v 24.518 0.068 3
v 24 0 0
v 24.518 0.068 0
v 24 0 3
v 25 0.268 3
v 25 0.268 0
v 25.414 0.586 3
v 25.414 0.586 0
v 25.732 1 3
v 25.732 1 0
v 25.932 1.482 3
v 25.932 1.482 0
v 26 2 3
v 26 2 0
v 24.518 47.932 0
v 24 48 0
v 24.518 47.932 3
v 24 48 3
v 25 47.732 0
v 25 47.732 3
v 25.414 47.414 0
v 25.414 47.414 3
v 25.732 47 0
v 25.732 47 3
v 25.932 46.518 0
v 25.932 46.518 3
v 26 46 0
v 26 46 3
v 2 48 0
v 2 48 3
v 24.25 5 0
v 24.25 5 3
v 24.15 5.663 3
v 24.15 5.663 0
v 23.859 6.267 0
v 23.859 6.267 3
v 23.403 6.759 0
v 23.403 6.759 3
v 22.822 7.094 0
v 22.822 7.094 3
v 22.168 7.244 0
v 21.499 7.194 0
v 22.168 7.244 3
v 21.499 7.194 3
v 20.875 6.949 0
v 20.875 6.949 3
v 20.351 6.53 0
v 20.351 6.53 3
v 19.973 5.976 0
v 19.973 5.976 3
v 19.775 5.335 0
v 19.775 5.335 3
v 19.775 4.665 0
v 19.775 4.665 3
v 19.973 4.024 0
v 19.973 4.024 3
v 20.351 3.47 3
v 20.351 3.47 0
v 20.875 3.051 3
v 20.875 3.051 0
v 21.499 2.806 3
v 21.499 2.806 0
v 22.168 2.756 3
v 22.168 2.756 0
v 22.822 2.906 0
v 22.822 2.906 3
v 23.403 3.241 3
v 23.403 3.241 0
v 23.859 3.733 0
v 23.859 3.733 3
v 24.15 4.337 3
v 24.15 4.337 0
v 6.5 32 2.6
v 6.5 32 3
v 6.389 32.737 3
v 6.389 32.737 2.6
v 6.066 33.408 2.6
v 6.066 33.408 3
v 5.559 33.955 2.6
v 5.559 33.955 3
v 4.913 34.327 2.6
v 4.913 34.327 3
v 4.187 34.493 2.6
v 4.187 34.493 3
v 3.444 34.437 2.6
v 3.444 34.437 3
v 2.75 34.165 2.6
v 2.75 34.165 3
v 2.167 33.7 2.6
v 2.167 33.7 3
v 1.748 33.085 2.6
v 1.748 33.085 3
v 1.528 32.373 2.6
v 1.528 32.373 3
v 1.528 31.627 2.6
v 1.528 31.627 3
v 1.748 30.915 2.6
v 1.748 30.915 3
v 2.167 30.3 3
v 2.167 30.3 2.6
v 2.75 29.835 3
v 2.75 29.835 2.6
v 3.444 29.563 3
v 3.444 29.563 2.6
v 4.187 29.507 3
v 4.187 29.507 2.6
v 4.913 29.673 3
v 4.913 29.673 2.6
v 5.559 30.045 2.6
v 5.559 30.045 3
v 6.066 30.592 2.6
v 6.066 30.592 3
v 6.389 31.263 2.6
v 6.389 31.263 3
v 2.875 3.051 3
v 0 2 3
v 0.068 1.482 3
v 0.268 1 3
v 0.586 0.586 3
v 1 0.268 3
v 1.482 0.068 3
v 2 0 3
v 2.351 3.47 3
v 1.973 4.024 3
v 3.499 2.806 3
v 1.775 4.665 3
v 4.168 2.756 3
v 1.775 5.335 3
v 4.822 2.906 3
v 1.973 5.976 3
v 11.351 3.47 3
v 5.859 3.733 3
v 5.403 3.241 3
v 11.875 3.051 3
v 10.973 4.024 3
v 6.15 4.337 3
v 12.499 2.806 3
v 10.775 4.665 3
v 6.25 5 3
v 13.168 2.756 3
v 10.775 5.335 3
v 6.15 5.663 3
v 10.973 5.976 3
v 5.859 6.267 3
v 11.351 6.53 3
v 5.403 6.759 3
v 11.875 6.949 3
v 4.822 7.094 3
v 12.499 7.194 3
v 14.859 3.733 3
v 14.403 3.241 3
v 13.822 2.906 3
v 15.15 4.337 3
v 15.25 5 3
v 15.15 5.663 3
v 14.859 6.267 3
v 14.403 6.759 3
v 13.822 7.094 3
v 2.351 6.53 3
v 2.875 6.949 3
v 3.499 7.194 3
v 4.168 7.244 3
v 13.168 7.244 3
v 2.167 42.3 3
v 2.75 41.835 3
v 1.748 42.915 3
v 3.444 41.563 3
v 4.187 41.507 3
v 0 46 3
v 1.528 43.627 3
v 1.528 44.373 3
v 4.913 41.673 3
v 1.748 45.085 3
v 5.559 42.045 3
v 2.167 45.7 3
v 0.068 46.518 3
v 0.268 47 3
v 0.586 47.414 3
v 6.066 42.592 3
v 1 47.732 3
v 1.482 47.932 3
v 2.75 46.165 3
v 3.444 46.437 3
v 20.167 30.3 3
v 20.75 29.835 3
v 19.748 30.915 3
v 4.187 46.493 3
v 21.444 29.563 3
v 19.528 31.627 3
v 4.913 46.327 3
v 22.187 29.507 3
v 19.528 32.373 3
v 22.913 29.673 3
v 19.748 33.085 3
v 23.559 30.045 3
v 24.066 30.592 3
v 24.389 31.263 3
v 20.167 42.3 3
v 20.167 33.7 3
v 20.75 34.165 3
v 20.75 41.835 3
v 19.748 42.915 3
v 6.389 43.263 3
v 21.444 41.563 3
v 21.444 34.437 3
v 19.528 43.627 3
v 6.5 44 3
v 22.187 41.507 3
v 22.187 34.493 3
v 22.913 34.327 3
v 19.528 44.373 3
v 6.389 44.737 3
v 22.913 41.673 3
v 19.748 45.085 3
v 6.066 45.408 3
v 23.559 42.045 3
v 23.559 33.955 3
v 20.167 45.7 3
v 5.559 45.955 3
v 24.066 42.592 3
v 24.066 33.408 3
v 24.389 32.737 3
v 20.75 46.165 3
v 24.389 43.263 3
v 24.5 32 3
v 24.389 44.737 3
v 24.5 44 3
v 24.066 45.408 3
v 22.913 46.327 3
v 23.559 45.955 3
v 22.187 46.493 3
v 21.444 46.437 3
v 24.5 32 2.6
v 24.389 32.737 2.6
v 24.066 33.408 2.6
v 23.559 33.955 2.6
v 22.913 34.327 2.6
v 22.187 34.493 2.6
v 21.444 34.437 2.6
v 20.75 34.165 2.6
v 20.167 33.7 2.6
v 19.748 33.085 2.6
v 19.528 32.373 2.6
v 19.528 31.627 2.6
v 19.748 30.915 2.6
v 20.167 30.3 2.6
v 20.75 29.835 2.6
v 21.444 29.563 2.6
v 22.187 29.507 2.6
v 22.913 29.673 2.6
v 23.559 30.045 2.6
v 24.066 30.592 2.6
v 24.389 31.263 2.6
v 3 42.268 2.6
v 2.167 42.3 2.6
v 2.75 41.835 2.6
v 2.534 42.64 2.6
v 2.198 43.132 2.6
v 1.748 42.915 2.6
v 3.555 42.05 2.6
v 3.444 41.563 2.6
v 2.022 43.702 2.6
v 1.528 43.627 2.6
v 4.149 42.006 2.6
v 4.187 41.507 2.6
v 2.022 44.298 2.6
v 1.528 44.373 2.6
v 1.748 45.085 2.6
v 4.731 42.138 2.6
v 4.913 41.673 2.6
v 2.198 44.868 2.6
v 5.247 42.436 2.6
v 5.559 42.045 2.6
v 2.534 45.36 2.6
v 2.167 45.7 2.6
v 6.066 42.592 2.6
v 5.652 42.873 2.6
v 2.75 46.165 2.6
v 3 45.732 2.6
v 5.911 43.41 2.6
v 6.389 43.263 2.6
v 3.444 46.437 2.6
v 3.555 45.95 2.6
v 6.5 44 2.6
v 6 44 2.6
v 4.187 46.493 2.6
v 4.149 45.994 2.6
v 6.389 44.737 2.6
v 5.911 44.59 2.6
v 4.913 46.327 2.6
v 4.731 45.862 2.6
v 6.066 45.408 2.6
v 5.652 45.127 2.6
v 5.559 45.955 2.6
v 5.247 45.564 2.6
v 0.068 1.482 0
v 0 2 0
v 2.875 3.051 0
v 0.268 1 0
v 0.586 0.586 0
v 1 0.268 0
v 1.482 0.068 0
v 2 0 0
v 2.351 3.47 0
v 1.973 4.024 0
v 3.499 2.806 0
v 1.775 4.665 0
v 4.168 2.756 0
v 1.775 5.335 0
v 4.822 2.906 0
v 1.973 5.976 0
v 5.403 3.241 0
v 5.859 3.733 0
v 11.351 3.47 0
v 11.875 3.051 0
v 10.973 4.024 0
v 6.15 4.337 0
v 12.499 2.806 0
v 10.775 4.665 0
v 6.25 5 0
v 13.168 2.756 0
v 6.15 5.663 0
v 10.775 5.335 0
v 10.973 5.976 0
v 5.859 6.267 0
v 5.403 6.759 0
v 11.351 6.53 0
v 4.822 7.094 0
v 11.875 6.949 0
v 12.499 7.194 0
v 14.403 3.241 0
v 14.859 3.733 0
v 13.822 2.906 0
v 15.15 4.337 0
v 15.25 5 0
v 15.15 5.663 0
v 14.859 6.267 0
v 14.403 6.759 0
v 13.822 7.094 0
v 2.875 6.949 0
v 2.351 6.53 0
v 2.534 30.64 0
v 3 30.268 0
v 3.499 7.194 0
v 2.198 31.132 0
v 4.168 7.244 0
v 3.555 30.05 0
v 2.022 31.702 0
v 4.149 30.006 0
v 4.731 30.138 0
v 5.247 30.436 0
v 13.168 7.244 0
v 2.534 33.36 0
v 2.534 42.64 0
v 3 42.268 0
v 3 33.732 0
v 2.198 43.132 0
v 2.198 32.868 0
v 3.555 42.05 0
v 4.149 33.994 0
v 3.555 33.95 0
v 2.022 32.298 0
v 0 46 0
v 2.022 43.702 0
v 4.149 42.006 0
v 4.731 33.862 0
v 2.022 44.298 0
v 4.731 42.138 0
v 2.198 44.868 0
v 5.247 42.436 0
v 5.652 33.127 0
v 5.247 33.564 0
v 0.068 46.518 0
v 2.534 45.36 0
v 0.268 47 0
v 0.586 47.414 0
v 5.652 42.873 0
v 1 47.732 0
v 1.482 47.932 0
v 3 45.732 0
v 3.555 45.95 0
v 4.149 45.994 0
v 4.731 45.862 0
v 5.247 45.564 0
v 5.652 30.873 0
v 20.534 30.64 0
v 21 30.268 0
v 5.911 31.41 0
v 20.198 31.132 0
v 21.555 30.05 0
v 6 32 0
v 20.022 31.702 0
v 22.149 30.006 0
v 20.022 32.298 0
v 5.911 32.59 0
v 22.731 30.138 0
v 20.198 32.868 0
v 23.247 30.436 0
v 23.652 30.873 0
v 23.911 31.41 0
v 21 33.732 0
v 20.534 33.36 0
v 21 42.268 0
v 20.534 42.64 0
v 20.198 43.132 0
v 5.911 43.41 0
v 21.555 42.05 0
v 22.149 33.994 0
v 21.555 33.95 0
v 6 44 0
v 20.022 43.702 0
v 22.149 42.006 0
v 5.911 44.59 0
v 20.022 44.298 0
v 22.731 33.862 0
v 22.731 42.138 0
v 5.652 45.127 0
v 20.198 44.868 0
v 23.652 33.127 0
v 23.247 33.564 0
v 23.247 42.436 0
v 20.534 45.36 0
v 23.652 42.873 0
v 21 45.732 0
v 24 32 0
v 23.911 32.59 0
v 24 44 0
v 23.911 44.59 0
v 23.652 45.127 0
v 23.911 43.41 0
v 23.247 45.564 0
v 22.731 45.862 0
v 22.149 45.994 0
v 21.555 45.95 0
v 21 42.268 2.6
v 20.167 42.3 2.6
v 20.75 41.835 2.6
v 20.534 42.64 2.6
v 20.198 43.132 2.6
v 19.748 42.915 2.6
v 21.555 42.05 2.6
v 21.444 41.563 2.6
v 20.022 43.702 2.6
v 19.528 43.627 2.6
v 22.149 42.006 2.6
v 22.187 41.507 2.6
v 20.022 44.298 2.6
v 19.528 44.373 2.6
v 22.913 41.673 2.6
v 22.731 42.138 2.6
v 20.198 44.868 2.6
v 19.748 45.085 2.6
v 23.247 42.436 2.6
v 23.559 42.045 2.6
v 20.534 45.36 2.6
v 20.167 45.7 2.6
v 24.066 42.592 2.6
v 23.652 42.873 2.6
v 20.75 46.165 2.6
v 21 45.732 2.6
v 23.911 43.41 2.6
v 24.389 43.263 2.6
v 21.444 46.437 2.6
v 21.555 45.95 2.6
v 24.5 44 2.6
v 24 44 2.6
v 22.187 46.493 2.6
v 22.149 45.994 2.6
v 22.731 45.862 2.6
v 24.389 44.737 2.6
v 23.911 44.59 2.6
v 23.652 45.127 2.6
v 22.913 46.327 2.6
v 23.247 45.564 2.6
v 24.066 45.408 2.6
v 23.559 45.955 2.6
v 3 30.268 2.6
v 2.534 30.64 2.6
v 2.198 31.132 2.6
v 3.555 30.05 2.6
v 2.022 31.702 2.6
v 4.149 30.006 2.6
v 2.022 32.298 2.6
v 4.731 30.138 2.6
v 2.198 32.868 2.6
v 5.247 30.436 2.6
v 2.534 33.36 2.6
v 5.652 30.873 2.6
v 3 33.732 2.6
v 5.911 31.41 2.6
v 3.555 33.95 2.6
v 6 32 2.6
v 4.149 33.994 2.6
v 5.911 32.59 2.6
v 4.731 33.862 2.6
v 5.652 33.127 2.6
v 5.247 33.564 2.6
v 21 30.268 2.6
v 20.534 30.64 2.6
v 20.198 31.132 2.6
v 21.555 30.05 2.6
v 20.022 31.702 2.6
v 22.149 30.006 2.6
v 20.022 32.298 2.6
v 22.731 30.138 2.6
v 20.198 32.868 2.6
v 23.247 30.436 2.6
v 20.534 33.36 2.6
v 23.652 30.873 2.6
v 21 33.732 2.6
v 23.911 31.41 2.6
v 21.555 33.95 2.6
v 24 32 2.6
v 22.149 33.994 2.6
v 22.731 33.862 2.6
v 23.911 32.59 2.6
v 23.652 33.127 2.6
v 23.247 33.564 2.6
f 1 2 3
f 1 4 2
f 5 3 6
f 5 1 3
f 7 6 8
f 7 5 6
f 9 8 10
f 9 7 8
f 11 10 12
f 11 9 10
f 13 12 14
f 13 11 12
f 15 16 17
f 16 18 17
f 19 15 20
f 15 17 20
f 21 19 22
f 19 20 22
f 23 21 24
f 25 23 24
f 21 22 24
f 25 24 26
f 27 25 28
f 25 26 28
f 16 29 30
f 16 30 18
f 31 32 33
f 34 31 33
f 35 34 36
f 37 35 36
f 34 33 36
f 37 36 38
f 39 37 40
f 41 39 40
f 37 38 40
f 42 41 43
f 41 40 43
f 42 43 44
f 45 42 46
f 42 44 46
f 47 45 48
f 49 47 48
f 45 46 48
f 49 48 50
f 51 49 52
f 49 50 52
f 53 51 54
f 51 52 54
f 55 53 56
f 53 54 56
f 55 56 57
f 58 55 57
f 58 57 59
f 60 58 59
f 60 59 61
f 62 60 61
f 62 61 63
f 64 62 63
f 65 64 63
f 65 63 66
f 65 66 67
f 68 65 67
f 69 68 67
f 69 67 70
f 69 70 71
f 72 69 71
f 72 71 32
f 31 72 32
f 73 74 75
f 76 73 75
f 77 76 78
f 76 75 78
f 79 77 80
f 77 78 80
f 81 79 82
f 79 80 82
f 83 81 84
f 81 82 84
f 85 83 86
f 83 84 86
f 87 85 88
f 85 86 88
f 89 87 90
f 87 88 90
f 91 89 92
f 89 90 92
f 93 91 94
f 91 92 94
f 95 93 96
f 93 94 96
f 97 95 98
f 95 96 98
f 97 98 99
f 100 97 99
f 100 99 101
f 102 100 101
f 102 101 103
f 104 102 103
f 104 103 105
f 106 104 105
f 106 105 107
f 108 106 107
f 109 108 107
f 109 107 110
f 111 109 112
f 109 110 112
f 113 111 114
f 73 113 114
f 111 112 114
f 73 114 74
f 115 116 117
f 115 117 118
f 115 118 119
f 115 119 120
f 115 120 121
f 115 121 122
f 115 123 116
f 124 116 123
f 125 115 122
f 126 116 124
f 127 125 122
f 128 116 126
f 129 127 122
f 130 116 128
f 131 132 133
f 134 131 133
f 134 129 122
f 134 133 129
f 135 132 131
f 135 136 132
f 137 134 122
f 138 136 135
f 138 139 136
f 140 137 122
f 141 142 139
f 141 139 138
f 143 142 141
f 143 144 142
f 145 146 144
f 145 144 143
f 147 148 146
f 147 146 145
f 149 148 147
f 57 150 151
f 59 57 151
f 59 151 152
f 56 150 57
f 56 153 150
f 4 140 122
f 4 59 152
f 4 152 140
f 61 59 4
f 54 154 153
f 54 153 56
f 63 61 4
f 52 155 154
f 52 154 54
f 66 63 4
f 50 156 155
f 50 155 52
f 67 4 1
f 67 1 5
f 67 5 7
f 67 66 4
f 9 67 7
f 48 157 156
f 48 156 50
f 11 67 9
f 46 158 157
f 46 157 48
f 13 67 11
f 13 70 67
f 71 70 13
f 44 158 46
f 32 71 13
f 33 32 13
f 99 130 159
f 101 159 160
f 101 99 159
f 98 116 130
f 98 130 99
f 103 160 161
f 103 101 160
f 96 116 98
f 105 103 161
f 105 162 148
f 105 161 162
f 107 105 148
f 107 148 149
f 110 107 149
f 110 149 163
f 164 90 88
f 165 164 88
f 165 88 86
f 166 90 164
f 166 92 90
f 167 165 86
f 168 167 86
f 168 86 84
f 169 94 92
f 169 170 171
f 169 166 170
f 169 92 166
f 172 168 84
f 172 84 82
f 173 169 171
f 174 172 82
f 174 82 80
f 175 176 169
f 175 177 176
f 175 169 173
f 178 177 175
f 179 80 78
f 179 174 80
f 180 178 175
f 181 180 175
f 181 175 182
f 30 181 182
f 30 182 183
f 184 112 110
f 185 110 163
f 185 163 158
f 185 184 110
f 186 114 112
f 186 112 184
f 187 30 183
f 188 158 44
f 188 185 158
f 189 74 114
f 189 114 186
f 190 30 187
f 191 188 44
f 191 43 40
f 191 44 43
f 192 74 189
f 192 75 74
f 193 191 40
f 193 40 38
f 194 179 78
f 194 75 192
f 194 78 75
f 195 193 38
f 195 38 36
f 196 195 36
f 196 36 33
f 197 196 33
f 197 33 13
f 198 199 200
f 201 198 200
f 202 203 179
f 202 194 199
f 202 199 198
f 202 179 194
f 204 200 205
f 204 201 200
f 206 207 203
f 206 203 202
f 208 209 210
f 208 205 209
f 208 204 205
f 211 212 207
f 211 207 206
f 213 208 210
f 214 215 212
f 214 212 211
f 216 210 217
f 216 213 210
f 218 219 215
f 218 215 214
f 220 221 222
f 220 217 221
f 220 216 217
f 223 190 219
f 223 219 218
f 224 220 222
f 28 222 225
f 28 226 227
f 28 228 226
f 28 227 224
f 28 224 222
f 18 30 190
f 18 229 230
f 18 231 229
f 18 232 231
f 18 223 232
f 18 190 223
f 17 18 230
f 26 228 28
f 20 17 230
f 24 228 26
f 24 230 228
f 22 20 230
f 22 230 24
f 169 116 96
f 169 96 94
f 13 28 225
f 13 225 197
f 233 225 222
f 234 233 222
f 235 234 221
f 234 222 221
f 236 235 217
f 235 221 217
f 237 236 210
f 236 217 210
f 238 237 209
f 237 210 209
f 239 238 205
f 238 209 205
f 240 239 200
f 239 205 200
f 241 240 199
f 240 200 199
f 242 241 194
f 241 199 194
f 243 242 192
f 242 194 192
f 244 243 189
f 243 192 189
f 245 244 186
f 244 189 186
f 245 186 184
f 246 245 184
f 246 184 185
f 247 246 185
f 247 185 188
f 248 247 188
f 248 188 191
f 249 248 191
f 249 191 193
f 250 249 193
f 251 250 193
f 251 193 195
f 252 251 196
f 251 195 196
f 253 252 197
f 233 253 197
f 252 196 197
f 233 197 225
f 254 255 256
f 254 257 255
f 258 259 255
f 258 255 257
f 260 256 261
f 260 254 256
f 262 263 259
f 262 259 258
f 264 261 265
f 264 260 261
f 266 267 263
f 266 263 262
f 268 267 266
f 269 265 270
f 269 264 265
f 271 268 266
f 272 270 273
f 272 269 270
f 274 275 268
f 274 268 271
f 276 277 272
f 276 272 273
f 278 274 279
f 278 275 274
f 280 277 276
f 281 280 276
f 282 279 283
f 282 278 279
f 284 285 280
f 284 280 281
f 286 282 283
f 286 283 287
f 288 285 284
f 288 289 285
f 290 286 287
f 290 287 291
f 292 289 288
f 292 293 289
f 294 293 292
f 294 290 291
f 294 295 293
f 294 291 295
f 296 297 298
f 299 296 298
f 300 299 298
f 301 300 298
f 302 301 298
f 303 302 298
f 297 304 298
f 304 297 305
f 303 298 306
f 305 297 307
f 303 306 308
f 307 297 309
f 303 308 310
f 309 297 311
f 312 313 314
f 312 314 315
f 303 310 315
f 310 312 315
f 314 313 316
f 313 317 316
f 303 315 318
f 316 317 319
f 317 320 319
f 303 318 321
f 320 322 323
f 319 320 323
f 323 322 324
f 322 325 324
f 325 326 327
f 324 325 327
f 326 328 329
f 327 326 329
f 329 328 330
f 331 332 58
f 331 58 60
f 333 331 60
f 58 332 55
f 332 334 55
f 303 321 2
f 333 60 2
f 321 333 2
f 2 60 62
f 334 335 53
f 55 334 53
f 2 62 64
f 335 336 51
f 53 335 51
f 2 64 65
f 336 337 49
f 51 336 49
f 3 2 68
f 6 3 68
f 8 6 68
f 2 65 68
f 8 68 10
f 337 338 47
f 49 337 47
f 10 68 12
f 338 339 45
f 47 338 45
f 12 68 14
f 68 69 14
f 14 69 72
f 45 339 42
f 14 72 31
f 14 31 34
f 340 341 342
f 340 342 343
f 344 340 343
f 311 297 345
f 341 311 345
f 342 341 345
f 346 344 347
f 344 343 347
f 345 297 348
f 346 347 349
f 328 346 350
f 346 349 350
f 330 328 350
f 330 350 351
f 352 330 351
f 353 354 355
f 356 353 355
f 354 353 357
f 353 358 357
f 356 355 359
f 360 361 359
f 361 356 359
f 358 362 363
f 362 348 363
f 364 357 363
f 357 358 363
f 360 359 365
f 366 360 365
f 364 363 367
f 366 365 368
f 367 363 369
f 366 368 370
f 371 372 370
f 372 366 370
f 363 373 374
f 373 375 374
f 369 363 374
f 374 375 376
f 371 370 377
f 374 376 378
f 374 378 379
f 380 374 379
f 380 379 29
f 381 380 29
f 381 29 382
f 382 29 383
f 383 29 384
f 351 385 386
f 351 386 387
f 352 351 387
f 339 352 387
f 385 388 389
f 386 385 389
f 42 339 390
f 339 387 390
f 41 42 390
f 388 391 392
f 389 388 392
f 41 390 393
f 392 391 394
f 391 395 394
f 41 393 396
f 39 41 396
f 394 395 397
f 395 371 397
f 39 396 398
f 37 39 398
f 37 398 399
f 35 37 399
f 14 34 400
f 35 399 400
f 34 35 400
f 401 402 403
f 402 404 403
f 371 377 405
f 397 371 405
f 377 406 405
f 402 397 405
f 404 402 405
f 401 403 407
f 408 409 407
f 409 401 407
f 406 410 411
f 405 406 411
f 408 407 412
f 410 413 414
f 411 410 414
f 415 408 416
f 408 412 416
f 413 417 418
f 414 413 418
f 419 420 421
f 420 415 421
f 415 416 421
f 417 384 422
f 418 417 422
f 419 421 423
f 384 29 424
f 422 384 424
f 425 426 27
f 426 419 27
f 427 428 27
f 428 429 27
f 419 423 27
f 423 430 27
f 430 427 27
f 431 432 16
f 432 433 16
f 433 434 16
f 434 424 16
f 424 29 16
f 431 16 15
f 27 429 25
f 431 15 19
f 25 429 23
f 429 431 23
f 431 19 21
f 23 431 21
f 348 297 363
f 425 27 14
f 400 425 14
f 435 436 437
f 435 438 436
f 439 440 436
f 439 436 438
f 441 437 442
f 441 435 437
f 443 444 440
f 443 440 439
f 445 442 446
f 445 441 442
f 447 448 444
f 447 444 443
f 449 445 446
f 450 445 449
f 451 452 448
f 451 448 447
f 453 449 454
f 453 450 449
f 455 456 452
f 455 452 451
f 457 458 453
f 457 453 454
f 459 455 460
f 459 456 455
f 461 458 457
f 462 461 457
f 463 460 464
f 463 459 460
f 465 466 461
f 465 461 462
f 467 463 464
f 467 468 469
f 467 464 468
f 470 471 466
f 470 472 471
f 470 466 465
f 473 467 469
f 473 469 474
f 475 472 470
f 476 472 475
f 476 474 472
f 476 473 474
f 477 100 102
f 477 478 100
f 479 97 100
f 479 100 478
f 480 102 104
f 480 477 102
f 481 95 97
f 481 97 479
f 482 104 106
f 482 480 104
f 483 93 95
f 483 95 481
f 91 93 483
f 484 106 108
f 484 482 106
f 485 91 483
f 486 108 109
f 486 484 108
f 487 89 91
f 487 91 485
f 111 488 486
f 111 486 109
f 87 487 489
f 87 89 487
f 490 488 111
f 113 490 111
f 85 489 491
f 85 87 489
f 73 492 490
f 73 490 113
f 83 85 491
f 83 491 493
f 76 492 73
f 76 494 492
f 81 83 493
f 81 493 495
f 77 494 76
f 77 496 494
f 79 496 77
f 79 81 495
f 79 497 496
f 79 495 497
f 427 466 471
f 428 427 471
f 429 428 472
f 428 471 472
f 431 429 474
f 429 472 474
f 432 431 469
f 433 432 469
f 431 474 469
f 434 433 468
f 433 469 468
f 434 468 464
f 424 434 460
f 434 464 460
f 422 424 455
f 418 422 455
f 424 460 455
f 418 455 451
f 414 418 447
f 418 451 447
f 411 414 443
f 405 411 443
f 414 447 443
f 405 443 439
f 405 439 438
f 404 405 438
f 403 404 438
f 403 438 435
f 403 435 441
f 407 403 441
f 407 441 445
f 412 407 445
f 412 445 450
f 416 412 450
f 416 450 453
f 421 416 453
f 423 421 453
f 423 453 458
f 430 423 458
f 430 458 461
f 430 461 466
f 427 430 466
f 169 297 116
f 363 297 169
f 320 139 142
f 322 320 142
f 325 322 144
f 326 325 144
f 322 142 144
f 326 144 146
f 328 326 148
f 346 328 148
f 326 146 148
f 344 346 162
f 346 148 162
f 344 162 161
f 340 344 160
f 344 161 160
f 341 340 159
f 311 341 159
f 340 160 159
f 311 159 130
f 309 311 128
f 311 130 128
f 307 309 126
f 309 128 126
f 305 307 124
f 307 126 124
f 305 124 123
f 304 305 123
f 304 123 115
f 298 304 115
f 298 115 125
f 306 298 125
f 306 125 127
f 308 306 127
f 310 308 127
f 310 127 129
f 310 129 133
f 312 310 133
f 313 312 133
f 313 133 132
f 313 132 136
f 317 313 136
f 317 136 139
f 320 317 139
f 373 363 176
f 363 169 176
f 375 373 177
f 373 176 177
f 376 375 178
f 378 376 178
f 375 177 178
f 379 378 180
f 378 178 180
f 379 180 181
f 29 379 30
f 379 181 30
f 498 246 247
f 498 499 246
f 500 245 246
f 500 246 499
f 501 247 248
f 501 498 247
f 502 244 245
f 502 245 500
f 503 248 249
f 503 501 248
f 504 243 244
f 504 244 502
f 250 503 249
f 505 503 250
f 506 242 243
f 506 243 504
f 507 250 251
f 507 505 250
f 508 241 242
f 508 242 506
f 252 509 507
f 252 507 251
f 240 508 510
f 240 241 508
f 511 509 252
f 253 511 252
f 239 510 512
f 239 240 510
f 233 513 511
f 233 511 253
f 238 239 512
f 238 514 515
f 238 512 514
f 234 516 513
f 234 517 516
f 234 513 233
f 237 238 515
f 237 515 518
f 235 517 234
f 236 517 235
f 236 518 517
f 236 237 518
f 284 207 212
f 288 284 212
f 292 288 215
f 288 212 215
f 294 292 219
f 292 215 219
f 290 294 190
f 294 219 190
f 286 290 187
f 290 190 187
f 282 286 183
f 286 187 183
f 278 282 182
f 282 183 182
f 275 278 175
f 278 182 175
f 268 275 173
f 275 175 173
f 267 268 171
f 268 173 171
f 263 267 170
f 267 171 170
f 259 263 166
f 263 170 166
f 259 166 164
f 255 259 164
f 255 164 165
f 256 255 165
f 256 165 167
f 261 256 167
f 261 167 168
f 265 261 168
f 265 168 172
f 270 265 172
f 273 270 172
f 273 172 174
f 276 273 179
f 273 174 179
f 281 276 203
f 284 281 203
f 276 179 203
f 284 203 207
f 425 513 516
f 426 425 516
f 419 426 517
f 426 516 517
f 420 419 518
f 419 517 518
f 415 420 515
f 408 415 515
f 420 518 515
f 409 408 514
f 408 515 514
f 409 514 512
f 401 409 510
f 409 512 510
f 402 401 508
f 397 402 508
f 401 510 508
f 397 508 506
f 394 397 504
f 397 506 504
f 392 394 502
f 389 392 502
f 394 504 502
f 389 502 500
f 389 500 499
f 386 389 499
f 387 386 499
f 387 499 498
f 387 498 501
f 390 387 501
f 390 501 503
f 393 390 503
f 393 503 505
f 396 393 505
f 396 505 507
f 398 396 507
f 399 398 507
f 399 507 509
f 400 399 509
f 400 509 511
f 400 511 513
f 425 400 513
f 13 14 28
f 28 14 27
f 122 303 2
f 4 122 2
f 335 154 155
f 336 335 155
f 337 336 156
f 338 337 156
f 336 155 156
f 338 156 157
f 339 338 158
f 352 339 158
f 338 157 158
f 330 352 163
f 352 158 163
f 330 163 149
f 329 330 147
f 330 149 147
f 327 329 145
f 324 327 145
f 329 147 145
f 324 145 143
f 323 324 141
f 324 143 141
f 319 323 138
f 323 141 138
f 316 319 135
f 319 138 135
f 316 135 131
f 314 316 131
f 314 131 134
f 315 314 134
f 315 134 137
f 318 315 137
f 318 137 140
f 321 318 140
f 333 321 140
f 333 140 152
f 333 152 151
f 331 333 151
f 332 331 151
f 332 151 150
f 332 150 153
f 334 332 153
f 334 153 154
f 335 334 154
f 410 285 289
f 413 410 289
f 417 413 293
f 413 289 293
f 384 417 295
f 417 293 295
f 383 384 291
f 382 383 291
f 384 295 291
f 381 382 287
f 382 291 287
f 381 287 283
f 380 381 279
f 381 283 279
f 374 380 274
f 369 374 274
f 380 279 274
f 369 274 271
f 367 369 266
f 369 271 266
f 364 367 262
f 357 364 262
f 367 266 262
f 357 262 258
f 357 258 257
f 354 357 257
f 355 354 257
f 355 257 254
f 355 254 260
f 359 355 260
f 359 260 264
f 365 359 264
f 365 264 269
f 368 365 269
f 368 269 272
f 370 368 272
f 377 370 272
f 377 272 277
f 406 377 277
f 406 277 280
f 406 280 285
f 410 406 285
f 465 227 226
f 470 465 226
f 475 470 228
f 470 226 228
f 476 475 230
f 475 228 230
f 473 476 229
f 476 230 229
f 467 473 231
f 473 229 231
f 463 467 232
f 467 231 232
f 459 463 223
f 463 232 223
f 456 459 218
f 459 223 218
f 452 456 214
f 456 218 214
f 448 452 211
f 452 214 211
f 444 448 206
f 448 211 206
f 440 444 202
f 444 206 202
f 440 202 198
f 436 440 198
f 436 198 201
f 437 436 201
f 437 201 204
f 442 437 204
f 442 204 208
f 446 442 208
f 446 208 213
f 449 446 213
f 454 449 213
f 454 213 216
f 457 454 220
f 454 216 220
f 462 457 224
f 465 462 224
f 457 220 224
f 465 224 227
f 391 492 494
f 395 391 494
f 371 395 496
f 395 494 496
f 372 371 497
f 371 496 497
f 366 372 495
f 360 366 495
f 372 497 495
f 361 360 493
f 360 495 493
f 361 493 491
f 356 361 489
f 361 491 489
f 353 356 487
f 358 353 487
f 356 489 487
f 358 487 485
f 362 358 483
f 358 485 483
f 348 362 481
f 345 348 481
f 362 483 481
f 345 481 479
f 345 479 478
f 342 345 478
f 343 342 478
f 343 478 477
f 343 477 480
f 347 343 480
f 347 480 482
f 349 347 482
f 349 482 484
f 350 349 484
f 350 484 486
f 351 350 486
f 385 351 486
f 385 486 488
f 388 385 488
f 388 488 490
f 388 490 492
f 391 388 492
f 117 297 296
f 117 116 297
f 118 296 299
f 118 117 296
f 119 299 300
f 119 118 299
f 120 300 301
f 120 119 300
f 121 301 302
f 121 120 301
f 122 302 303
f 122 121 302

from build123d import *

# Parameters (mm, degrees)
ESQUISSE1_W                  = 26
ESQUISSE1_H                  = 48
BOSS_EXTRU_1_DEPTH           = 3
ESQUISSE2_R                  = 2
ENL_V_MAT_EXTRU_1_DEPTH      = 1
ENL_V_MAT_EXTRU_1_DEPTH_BACK = 4
ESQUISSE3_R                  = 2.25
ENL_V_MAT_EXTRU_2_DEPTH      = 1
ENL_V_MAT_EXTRU_2_DEPTH_BACK = 4
ESQUISSE4_R                  = 2.5
ENL_V_MAT_EXTRU_3_DEPTH      = 0.4
CONG_1_R                     = 2


with BuildPart() as part:
    # Esquisse1 → Boss.-Extru.1 (new body)
    with BuildSketch(Plane.XY):
        with Locations((13, 24)):
            Rectangle(ESQUISSE1_W, ESQUISSE1_H)
    extrude(amount=BOSS_EXTRU_1_DEPTH)

    # Esquisse2 → Enlèv. mat.-Extru.1 (cut, two sides)
    with BuildSketch(Plane.XY.offset(3)) as enl_v_mat_extru_1_sk:
        with Locations((4, 44)):
            Circle(ESQUISSE2_R)
        with Locations((4, 32)):
            Circle(ESQUISSE2_R)
        with Locations((22, 32)):
            Circle(ESQUISSE2_R)
        with Locations((22, 44)):
            Circle(ESQUISSE2_R)
    extrude(amount=ENL_V_MAT_EXTRU_1_DEPTH, mode=Mode.SUBTRACT)
    extrude(enl_v_mat_extru_1_sk.sketch, amount=-ENL_V_MAT_EXTRU_1_DEPTH_BACK, mode=Mode.SUBTRACT)

    # Esquisse3 → Enlèv. mat.-Extru.2 (cut, two sides)
    with BuildSketch(Plane.XY.offset(3)) as enl_v_mat_extru_2_sk:
        with Locations((13, 5)):
            Circle(ESQUISSE3_R)
        with Locations((4, 5)):
            Circle(ESQUISSE3_R)
        with Locations((22, 5)):
            Circle(ESQUISSE3_R)
    extrude(amount=ENL_V_MAT_EXTRU_2_DEPTH, mode=Mode.SUBTRACT)
    extrude(enl_v_mat_extru_2_sk.sketch, amount=-ENL_V_MAT_EXTRU_2_DEPTH_BACK, mode=Mode.SUBTRACT)

    # Esquisse4 → Enlèv. mat.-Extru.3 (cut)
    with BuildSketch(Plane.XY.offset(3)):
        with Locations((4, 32)):
            Circle(ESQUISSE4_R)
        with Locations((22, 32)):
            Circle(ESQUISSE4_R)
        with Locations((22, 44)):
            Circle(ESQUISSE4_R)
        with Locations((4, 44)):
            Circle(ESQUISSE4_R)
    extrude(amount=-ENL_V_MAT_EXTRU_3_DEPTH, mode=Mode.SUBTRACT)

    # Congé1
    cong_1_edges = [part.edges().sort_by_distance(p)[0] for p in [
        (0, 48, 1.5),
        (26, 48, 1.5),
        (26, 0, 1.5),
        (0, 0, 1.5),
    ]]
    fillet(cong_1_edges, radius=CONG_1_R)


solid = part.part
